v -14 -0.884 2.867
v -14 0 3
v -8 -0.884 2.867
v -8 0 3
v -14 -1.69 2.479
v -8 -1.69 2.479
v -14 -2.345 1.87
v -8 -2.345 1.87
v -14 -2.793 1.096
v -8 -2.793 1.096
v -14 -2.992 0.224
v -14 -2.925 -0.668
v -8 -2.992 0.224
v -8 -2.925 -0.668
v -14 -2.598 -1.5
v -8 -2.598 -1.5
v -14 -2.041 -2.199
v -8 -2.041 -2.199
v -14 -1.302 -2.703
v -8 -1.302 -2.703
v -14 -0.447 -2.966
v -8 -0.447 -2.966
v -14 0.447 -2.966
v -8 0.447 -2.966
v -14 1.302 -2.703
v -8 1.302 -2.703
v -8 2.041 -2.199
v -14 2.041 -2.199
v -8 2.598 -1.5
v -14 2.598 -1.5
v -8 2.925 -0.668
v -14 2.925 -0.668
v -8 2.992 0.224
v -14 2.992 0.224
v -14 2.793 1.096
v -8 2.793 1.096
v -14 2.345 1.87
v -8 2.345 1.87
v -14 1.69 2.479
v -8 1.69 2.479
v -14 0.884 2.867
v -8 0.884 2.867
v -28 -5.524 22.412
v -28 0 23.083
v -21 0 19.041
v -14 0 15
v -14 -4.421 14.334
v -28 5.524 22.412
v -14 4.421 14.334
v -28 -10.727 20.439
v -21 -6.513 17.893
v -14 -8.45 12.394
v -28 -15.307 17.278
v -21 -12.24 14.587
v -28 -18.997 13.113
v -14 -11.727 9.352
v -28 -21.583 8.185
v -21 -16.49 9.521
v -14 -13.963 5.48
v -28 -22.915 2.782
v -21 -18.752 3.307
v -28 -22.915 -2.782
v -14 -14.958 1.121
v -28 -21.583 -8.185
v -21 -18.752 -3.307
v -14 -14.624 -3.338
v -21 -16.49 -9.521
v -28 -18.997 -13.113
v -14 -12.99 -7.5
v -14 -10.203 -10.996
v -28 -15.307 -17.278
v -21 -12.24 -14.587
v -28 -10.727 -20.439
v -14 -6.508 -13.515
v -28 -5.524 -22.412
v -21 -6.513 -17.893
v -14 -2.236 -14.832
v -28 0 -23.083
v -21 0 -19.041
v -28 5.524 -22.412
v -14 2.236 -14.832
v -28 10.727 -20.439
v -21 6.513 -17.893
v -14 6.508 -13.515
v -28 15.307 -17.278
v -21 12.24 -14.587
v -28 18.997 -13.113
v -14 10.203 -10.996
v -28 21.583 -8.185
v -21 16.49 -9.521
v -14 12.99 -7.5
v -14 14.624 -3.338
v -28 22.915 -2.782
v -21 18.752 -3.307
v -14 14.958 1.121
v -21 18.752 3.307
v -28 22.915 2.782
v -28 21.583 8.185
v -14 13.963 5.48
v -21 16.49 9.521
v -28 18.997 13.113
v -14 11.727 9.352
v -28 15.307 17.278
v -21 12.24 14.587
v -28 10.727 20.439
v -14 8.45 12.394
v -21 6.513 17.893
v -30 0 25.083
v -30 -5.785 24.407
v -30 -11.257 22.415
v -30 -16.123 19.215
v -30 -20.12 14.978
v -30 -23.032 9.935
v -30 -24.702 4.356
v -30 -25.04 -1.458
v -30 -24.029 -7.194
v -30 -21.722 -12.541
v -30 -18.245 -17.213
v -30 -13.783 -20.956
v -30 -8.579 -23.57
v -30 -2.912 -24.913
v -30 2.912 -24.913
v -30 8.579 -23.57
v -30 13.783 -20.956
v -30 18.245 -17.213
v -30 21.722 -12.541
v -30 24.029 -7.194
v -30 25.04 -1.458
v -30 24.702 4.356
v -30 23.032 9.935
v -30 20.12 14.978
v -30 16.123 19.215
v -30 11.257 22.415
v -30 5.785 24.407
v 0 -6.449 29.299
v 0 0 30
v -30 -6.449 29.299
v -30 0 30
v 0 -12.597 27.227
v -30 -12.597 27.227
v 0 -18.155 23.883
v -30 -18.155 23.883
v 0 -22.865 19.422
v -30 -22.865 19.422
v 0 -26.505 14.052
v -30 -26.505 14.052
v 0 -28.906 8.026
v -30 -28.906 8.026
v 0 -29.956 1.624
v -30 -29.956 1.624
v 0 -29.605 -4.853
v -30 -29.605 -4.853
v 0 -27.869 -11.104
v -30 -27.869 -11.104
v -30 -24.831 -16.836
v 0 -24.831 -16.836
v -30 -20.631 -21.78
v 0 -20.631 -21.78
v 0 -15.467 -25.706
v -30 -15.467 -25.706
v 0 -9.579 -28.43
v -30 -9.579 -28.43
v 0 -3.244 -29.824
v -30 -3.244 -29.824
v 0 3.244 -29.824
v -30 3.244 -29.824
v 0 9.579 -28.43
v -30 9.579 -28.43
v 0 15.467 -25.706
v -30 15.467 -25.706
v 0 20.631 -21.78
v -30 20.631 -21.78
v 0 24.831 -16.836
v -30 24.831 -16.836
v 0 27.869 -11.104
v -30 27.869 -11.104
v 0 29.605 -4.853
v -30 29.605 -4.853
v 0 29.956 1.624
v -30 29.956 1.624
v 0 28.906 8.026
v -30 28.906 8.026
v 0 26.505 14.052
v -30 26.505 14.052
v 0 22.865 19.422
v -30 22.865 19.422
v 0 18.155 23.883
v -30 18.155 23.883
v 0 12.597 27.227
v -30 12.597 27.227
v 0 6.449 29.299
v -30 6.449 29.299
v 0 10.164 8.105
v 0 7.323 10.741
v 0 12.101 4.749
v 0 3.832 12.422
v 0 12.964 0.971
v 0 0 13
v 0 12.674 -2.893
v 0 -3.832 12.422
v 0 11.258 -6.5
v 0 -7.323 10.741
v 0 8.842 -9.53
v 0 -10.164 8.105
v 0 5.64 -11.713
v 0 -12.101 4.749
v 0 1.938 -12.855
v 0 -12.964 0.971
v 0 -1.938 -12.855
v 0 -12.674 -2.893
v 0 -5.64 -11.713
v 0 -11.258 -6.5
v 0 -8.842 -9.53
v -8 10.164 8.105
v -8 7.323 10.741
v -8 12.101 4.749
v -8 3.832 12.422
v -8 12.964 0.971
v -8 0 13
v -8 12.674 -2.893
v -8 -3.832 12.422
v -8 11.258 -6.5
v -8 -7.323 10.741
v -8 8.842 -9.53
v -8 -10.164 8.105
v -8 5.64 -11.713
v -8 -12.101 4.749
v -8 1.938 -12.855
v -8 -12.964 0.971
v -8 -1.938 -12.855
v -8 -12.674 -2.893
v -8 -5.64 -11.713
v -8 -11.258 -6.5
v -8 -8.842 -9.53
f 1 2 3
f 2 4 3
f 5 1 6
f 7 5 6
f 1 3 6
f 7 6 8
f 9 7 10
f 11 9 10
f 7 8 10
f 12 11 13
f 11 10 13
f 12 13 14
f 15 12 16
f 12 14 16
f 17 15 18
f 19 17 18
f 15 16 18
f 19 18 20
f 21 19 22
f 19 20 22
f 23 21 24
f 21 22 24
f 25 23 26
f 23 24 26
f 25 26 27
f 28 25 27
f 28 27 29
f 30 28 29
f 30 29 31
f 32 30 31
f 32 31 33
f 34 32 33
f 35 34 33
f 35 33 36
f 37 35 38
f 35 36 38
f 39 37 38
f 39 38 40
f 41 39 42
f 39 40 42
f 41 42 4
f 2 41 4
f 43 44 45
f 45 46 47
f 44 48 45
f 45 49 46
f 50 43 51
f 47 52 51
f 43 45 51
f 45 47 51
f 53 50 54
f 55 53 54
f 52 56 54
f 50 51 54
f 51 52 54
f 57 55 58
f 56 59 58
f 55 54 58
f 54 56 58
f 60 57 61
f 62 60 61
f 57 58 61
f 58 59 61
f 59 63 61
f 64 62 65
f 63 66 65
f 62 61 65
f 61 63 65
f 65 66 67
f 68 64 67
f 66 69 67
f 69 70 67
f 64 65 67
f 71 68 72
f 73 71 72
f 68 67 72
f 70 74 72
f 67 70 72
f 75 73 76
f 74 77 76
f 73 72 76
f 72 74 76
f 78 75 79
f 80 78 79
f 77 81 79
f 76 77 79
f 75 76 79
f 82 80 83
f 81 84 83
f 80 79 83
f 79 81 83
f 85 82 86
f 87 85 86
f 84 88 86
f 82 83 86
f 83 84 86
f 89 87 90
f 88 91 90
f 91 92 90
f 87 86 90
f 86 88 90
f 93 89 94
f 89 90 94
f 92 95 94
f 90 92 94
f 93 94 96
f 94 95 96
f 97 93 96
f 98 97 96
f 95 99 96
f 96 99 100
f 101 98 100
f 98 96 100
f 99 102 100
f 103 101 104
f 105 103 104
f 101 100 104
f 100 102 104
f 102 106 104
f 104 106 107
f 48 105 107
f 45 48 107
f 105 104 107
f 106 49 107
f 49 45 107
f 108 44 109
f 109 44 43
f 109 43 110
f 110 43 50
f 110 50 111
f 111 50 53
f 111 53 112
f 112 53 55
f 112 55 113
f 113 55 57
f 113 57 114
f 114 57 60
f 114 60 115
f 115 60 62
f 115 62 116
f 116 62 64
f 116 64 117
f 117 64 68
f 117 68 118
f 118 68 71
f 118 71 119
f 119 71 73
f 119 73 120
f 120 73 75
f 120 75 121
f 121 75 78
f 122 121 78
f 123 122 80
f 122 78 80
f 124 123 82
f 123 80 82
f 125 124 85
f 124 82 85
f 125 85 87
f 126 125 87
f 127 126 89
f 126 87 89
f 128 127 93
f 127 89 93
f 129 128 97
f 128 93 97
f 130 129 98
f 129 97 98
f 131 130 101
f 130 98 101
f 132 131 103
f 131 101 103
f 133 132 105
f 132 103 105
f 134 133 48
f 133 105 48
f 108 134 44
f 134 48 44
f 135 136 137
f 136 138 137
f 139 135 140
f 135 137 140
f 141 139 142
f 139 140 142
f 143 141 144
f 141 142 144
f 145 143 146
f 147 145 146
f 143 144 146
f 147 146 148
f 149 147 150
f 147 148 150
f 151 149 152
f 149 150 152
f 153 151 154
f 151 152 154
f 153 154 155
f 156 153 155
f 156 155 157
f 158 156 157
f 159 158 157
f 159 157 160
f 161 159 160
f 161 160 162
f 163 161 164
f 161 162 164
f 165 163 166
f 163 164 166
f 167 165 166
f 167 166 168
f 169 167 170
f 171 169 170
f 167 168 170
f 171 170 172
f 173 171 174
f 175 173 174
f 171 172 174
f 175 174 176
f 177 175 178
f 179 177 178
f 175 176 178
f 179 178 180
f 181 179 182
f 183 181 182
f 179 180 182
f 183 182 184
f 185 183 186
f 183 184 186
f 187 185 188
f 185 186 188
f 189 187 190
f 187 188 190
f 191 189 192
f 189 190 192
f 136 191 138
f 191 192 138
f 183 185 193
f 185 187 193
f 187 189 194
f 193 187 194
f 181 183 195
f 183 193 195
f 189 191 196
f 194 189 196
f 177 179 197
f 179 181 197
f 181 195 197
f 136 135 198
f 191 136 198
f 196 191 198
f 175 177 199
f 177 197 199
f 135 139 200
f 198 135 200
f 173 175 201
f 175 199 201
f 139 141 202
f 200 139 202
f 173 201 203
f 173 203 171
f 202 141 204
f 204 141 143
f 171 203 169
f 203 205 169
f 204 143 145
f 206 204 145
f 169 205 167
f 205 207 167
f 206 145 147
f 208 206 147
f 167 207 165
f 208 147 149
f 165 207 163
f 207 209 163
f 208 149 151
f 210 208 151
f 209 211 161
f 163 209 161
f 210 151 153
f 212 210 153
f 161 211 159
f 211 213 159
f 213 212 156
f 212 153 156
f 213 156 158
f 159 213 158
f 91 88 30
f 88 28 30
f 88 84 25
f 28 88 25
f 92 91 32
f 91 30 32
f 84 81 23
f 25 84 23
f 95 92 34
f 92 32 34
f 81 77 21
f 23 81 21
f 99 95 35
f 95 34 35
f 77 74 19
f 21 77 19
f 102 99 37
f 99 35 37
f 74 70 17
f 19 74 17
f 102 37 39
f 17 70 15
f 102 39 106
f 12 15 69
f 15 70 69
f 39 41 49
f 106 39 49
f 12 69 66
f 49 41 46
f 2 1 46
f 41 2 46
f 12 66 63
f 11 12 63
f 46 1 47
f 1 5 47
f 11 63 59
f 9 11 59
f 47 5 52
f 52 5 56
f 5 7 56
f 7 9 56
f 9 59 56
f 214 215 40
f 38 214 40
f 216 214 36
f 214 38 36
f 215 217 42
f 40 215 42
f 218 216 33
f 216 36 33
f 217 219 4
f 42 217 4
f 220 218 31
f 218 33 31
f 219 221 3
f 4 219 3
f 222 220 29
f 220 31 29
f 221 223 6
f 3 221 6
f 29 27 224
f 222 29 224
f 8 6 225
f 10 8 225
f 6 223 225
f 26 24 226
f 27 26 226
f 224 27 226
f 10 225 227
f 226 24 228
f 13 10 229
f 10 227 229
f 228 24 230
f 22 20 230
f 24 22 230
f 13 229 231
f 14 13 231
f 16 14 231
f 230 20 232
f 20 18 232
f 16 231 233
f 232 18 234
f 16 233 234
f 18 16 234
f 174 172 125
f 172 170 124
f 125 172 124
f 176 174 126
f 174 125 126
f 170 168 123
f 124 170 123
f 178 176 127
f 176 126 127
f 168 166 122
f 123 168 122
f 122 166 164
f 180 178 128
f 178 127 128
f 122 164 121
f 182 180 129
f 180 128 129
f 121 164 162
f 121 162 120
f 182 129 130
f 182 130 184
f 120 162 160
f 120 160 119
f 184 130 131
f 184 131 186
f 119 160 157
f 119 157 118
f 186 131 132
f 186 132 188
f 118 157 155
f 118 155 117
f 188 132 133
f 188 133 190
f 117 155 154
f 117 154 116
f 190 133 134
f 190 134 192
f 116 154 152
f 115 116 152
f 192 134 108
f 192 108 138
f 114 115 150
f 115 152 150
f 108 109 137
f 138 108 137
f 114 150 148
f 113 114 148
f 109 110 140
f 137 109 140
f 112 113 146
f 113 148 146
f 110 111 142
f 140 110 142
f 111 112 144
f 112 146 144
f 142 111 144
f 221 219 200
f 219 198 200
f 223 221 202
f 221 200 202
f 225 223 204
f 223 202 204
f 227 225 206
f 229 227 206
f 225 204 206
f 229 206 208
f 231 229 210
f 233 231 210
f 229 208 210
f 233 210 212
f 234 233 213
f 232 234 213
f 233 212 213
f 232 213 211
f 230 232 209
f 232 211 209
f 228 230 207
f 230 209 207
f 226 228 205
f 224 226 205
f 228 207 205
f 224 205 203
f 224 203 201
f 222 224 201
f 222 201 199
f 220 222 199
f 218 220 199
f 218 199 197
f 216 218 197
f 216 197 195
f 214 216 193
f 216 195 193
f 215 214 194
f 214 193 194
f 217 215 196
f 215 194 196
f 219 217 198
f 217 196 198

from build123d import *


with BuildPart() as part:
    # Эскиз4 → Повернуть1 (revolve)
    with BuildSketch(Plane.XY, mode=Mode.PRIVATE) as revolve_1_sk:
        Polygon((-30, 30), (-30, 25.082903769), (-28, 23.082903769), (-14, 15), (-14, 3), (-8, 3), (-8, 13), (0, 13), (0, 30), align=None)
    revolve(revolve_1_sk.sketch.rotate(Axis((-30, 0, 0), (1, 0, 0)), 90), axis=Axis((-30, 0, 0), (1, 0, 0)))


solid = part.part
